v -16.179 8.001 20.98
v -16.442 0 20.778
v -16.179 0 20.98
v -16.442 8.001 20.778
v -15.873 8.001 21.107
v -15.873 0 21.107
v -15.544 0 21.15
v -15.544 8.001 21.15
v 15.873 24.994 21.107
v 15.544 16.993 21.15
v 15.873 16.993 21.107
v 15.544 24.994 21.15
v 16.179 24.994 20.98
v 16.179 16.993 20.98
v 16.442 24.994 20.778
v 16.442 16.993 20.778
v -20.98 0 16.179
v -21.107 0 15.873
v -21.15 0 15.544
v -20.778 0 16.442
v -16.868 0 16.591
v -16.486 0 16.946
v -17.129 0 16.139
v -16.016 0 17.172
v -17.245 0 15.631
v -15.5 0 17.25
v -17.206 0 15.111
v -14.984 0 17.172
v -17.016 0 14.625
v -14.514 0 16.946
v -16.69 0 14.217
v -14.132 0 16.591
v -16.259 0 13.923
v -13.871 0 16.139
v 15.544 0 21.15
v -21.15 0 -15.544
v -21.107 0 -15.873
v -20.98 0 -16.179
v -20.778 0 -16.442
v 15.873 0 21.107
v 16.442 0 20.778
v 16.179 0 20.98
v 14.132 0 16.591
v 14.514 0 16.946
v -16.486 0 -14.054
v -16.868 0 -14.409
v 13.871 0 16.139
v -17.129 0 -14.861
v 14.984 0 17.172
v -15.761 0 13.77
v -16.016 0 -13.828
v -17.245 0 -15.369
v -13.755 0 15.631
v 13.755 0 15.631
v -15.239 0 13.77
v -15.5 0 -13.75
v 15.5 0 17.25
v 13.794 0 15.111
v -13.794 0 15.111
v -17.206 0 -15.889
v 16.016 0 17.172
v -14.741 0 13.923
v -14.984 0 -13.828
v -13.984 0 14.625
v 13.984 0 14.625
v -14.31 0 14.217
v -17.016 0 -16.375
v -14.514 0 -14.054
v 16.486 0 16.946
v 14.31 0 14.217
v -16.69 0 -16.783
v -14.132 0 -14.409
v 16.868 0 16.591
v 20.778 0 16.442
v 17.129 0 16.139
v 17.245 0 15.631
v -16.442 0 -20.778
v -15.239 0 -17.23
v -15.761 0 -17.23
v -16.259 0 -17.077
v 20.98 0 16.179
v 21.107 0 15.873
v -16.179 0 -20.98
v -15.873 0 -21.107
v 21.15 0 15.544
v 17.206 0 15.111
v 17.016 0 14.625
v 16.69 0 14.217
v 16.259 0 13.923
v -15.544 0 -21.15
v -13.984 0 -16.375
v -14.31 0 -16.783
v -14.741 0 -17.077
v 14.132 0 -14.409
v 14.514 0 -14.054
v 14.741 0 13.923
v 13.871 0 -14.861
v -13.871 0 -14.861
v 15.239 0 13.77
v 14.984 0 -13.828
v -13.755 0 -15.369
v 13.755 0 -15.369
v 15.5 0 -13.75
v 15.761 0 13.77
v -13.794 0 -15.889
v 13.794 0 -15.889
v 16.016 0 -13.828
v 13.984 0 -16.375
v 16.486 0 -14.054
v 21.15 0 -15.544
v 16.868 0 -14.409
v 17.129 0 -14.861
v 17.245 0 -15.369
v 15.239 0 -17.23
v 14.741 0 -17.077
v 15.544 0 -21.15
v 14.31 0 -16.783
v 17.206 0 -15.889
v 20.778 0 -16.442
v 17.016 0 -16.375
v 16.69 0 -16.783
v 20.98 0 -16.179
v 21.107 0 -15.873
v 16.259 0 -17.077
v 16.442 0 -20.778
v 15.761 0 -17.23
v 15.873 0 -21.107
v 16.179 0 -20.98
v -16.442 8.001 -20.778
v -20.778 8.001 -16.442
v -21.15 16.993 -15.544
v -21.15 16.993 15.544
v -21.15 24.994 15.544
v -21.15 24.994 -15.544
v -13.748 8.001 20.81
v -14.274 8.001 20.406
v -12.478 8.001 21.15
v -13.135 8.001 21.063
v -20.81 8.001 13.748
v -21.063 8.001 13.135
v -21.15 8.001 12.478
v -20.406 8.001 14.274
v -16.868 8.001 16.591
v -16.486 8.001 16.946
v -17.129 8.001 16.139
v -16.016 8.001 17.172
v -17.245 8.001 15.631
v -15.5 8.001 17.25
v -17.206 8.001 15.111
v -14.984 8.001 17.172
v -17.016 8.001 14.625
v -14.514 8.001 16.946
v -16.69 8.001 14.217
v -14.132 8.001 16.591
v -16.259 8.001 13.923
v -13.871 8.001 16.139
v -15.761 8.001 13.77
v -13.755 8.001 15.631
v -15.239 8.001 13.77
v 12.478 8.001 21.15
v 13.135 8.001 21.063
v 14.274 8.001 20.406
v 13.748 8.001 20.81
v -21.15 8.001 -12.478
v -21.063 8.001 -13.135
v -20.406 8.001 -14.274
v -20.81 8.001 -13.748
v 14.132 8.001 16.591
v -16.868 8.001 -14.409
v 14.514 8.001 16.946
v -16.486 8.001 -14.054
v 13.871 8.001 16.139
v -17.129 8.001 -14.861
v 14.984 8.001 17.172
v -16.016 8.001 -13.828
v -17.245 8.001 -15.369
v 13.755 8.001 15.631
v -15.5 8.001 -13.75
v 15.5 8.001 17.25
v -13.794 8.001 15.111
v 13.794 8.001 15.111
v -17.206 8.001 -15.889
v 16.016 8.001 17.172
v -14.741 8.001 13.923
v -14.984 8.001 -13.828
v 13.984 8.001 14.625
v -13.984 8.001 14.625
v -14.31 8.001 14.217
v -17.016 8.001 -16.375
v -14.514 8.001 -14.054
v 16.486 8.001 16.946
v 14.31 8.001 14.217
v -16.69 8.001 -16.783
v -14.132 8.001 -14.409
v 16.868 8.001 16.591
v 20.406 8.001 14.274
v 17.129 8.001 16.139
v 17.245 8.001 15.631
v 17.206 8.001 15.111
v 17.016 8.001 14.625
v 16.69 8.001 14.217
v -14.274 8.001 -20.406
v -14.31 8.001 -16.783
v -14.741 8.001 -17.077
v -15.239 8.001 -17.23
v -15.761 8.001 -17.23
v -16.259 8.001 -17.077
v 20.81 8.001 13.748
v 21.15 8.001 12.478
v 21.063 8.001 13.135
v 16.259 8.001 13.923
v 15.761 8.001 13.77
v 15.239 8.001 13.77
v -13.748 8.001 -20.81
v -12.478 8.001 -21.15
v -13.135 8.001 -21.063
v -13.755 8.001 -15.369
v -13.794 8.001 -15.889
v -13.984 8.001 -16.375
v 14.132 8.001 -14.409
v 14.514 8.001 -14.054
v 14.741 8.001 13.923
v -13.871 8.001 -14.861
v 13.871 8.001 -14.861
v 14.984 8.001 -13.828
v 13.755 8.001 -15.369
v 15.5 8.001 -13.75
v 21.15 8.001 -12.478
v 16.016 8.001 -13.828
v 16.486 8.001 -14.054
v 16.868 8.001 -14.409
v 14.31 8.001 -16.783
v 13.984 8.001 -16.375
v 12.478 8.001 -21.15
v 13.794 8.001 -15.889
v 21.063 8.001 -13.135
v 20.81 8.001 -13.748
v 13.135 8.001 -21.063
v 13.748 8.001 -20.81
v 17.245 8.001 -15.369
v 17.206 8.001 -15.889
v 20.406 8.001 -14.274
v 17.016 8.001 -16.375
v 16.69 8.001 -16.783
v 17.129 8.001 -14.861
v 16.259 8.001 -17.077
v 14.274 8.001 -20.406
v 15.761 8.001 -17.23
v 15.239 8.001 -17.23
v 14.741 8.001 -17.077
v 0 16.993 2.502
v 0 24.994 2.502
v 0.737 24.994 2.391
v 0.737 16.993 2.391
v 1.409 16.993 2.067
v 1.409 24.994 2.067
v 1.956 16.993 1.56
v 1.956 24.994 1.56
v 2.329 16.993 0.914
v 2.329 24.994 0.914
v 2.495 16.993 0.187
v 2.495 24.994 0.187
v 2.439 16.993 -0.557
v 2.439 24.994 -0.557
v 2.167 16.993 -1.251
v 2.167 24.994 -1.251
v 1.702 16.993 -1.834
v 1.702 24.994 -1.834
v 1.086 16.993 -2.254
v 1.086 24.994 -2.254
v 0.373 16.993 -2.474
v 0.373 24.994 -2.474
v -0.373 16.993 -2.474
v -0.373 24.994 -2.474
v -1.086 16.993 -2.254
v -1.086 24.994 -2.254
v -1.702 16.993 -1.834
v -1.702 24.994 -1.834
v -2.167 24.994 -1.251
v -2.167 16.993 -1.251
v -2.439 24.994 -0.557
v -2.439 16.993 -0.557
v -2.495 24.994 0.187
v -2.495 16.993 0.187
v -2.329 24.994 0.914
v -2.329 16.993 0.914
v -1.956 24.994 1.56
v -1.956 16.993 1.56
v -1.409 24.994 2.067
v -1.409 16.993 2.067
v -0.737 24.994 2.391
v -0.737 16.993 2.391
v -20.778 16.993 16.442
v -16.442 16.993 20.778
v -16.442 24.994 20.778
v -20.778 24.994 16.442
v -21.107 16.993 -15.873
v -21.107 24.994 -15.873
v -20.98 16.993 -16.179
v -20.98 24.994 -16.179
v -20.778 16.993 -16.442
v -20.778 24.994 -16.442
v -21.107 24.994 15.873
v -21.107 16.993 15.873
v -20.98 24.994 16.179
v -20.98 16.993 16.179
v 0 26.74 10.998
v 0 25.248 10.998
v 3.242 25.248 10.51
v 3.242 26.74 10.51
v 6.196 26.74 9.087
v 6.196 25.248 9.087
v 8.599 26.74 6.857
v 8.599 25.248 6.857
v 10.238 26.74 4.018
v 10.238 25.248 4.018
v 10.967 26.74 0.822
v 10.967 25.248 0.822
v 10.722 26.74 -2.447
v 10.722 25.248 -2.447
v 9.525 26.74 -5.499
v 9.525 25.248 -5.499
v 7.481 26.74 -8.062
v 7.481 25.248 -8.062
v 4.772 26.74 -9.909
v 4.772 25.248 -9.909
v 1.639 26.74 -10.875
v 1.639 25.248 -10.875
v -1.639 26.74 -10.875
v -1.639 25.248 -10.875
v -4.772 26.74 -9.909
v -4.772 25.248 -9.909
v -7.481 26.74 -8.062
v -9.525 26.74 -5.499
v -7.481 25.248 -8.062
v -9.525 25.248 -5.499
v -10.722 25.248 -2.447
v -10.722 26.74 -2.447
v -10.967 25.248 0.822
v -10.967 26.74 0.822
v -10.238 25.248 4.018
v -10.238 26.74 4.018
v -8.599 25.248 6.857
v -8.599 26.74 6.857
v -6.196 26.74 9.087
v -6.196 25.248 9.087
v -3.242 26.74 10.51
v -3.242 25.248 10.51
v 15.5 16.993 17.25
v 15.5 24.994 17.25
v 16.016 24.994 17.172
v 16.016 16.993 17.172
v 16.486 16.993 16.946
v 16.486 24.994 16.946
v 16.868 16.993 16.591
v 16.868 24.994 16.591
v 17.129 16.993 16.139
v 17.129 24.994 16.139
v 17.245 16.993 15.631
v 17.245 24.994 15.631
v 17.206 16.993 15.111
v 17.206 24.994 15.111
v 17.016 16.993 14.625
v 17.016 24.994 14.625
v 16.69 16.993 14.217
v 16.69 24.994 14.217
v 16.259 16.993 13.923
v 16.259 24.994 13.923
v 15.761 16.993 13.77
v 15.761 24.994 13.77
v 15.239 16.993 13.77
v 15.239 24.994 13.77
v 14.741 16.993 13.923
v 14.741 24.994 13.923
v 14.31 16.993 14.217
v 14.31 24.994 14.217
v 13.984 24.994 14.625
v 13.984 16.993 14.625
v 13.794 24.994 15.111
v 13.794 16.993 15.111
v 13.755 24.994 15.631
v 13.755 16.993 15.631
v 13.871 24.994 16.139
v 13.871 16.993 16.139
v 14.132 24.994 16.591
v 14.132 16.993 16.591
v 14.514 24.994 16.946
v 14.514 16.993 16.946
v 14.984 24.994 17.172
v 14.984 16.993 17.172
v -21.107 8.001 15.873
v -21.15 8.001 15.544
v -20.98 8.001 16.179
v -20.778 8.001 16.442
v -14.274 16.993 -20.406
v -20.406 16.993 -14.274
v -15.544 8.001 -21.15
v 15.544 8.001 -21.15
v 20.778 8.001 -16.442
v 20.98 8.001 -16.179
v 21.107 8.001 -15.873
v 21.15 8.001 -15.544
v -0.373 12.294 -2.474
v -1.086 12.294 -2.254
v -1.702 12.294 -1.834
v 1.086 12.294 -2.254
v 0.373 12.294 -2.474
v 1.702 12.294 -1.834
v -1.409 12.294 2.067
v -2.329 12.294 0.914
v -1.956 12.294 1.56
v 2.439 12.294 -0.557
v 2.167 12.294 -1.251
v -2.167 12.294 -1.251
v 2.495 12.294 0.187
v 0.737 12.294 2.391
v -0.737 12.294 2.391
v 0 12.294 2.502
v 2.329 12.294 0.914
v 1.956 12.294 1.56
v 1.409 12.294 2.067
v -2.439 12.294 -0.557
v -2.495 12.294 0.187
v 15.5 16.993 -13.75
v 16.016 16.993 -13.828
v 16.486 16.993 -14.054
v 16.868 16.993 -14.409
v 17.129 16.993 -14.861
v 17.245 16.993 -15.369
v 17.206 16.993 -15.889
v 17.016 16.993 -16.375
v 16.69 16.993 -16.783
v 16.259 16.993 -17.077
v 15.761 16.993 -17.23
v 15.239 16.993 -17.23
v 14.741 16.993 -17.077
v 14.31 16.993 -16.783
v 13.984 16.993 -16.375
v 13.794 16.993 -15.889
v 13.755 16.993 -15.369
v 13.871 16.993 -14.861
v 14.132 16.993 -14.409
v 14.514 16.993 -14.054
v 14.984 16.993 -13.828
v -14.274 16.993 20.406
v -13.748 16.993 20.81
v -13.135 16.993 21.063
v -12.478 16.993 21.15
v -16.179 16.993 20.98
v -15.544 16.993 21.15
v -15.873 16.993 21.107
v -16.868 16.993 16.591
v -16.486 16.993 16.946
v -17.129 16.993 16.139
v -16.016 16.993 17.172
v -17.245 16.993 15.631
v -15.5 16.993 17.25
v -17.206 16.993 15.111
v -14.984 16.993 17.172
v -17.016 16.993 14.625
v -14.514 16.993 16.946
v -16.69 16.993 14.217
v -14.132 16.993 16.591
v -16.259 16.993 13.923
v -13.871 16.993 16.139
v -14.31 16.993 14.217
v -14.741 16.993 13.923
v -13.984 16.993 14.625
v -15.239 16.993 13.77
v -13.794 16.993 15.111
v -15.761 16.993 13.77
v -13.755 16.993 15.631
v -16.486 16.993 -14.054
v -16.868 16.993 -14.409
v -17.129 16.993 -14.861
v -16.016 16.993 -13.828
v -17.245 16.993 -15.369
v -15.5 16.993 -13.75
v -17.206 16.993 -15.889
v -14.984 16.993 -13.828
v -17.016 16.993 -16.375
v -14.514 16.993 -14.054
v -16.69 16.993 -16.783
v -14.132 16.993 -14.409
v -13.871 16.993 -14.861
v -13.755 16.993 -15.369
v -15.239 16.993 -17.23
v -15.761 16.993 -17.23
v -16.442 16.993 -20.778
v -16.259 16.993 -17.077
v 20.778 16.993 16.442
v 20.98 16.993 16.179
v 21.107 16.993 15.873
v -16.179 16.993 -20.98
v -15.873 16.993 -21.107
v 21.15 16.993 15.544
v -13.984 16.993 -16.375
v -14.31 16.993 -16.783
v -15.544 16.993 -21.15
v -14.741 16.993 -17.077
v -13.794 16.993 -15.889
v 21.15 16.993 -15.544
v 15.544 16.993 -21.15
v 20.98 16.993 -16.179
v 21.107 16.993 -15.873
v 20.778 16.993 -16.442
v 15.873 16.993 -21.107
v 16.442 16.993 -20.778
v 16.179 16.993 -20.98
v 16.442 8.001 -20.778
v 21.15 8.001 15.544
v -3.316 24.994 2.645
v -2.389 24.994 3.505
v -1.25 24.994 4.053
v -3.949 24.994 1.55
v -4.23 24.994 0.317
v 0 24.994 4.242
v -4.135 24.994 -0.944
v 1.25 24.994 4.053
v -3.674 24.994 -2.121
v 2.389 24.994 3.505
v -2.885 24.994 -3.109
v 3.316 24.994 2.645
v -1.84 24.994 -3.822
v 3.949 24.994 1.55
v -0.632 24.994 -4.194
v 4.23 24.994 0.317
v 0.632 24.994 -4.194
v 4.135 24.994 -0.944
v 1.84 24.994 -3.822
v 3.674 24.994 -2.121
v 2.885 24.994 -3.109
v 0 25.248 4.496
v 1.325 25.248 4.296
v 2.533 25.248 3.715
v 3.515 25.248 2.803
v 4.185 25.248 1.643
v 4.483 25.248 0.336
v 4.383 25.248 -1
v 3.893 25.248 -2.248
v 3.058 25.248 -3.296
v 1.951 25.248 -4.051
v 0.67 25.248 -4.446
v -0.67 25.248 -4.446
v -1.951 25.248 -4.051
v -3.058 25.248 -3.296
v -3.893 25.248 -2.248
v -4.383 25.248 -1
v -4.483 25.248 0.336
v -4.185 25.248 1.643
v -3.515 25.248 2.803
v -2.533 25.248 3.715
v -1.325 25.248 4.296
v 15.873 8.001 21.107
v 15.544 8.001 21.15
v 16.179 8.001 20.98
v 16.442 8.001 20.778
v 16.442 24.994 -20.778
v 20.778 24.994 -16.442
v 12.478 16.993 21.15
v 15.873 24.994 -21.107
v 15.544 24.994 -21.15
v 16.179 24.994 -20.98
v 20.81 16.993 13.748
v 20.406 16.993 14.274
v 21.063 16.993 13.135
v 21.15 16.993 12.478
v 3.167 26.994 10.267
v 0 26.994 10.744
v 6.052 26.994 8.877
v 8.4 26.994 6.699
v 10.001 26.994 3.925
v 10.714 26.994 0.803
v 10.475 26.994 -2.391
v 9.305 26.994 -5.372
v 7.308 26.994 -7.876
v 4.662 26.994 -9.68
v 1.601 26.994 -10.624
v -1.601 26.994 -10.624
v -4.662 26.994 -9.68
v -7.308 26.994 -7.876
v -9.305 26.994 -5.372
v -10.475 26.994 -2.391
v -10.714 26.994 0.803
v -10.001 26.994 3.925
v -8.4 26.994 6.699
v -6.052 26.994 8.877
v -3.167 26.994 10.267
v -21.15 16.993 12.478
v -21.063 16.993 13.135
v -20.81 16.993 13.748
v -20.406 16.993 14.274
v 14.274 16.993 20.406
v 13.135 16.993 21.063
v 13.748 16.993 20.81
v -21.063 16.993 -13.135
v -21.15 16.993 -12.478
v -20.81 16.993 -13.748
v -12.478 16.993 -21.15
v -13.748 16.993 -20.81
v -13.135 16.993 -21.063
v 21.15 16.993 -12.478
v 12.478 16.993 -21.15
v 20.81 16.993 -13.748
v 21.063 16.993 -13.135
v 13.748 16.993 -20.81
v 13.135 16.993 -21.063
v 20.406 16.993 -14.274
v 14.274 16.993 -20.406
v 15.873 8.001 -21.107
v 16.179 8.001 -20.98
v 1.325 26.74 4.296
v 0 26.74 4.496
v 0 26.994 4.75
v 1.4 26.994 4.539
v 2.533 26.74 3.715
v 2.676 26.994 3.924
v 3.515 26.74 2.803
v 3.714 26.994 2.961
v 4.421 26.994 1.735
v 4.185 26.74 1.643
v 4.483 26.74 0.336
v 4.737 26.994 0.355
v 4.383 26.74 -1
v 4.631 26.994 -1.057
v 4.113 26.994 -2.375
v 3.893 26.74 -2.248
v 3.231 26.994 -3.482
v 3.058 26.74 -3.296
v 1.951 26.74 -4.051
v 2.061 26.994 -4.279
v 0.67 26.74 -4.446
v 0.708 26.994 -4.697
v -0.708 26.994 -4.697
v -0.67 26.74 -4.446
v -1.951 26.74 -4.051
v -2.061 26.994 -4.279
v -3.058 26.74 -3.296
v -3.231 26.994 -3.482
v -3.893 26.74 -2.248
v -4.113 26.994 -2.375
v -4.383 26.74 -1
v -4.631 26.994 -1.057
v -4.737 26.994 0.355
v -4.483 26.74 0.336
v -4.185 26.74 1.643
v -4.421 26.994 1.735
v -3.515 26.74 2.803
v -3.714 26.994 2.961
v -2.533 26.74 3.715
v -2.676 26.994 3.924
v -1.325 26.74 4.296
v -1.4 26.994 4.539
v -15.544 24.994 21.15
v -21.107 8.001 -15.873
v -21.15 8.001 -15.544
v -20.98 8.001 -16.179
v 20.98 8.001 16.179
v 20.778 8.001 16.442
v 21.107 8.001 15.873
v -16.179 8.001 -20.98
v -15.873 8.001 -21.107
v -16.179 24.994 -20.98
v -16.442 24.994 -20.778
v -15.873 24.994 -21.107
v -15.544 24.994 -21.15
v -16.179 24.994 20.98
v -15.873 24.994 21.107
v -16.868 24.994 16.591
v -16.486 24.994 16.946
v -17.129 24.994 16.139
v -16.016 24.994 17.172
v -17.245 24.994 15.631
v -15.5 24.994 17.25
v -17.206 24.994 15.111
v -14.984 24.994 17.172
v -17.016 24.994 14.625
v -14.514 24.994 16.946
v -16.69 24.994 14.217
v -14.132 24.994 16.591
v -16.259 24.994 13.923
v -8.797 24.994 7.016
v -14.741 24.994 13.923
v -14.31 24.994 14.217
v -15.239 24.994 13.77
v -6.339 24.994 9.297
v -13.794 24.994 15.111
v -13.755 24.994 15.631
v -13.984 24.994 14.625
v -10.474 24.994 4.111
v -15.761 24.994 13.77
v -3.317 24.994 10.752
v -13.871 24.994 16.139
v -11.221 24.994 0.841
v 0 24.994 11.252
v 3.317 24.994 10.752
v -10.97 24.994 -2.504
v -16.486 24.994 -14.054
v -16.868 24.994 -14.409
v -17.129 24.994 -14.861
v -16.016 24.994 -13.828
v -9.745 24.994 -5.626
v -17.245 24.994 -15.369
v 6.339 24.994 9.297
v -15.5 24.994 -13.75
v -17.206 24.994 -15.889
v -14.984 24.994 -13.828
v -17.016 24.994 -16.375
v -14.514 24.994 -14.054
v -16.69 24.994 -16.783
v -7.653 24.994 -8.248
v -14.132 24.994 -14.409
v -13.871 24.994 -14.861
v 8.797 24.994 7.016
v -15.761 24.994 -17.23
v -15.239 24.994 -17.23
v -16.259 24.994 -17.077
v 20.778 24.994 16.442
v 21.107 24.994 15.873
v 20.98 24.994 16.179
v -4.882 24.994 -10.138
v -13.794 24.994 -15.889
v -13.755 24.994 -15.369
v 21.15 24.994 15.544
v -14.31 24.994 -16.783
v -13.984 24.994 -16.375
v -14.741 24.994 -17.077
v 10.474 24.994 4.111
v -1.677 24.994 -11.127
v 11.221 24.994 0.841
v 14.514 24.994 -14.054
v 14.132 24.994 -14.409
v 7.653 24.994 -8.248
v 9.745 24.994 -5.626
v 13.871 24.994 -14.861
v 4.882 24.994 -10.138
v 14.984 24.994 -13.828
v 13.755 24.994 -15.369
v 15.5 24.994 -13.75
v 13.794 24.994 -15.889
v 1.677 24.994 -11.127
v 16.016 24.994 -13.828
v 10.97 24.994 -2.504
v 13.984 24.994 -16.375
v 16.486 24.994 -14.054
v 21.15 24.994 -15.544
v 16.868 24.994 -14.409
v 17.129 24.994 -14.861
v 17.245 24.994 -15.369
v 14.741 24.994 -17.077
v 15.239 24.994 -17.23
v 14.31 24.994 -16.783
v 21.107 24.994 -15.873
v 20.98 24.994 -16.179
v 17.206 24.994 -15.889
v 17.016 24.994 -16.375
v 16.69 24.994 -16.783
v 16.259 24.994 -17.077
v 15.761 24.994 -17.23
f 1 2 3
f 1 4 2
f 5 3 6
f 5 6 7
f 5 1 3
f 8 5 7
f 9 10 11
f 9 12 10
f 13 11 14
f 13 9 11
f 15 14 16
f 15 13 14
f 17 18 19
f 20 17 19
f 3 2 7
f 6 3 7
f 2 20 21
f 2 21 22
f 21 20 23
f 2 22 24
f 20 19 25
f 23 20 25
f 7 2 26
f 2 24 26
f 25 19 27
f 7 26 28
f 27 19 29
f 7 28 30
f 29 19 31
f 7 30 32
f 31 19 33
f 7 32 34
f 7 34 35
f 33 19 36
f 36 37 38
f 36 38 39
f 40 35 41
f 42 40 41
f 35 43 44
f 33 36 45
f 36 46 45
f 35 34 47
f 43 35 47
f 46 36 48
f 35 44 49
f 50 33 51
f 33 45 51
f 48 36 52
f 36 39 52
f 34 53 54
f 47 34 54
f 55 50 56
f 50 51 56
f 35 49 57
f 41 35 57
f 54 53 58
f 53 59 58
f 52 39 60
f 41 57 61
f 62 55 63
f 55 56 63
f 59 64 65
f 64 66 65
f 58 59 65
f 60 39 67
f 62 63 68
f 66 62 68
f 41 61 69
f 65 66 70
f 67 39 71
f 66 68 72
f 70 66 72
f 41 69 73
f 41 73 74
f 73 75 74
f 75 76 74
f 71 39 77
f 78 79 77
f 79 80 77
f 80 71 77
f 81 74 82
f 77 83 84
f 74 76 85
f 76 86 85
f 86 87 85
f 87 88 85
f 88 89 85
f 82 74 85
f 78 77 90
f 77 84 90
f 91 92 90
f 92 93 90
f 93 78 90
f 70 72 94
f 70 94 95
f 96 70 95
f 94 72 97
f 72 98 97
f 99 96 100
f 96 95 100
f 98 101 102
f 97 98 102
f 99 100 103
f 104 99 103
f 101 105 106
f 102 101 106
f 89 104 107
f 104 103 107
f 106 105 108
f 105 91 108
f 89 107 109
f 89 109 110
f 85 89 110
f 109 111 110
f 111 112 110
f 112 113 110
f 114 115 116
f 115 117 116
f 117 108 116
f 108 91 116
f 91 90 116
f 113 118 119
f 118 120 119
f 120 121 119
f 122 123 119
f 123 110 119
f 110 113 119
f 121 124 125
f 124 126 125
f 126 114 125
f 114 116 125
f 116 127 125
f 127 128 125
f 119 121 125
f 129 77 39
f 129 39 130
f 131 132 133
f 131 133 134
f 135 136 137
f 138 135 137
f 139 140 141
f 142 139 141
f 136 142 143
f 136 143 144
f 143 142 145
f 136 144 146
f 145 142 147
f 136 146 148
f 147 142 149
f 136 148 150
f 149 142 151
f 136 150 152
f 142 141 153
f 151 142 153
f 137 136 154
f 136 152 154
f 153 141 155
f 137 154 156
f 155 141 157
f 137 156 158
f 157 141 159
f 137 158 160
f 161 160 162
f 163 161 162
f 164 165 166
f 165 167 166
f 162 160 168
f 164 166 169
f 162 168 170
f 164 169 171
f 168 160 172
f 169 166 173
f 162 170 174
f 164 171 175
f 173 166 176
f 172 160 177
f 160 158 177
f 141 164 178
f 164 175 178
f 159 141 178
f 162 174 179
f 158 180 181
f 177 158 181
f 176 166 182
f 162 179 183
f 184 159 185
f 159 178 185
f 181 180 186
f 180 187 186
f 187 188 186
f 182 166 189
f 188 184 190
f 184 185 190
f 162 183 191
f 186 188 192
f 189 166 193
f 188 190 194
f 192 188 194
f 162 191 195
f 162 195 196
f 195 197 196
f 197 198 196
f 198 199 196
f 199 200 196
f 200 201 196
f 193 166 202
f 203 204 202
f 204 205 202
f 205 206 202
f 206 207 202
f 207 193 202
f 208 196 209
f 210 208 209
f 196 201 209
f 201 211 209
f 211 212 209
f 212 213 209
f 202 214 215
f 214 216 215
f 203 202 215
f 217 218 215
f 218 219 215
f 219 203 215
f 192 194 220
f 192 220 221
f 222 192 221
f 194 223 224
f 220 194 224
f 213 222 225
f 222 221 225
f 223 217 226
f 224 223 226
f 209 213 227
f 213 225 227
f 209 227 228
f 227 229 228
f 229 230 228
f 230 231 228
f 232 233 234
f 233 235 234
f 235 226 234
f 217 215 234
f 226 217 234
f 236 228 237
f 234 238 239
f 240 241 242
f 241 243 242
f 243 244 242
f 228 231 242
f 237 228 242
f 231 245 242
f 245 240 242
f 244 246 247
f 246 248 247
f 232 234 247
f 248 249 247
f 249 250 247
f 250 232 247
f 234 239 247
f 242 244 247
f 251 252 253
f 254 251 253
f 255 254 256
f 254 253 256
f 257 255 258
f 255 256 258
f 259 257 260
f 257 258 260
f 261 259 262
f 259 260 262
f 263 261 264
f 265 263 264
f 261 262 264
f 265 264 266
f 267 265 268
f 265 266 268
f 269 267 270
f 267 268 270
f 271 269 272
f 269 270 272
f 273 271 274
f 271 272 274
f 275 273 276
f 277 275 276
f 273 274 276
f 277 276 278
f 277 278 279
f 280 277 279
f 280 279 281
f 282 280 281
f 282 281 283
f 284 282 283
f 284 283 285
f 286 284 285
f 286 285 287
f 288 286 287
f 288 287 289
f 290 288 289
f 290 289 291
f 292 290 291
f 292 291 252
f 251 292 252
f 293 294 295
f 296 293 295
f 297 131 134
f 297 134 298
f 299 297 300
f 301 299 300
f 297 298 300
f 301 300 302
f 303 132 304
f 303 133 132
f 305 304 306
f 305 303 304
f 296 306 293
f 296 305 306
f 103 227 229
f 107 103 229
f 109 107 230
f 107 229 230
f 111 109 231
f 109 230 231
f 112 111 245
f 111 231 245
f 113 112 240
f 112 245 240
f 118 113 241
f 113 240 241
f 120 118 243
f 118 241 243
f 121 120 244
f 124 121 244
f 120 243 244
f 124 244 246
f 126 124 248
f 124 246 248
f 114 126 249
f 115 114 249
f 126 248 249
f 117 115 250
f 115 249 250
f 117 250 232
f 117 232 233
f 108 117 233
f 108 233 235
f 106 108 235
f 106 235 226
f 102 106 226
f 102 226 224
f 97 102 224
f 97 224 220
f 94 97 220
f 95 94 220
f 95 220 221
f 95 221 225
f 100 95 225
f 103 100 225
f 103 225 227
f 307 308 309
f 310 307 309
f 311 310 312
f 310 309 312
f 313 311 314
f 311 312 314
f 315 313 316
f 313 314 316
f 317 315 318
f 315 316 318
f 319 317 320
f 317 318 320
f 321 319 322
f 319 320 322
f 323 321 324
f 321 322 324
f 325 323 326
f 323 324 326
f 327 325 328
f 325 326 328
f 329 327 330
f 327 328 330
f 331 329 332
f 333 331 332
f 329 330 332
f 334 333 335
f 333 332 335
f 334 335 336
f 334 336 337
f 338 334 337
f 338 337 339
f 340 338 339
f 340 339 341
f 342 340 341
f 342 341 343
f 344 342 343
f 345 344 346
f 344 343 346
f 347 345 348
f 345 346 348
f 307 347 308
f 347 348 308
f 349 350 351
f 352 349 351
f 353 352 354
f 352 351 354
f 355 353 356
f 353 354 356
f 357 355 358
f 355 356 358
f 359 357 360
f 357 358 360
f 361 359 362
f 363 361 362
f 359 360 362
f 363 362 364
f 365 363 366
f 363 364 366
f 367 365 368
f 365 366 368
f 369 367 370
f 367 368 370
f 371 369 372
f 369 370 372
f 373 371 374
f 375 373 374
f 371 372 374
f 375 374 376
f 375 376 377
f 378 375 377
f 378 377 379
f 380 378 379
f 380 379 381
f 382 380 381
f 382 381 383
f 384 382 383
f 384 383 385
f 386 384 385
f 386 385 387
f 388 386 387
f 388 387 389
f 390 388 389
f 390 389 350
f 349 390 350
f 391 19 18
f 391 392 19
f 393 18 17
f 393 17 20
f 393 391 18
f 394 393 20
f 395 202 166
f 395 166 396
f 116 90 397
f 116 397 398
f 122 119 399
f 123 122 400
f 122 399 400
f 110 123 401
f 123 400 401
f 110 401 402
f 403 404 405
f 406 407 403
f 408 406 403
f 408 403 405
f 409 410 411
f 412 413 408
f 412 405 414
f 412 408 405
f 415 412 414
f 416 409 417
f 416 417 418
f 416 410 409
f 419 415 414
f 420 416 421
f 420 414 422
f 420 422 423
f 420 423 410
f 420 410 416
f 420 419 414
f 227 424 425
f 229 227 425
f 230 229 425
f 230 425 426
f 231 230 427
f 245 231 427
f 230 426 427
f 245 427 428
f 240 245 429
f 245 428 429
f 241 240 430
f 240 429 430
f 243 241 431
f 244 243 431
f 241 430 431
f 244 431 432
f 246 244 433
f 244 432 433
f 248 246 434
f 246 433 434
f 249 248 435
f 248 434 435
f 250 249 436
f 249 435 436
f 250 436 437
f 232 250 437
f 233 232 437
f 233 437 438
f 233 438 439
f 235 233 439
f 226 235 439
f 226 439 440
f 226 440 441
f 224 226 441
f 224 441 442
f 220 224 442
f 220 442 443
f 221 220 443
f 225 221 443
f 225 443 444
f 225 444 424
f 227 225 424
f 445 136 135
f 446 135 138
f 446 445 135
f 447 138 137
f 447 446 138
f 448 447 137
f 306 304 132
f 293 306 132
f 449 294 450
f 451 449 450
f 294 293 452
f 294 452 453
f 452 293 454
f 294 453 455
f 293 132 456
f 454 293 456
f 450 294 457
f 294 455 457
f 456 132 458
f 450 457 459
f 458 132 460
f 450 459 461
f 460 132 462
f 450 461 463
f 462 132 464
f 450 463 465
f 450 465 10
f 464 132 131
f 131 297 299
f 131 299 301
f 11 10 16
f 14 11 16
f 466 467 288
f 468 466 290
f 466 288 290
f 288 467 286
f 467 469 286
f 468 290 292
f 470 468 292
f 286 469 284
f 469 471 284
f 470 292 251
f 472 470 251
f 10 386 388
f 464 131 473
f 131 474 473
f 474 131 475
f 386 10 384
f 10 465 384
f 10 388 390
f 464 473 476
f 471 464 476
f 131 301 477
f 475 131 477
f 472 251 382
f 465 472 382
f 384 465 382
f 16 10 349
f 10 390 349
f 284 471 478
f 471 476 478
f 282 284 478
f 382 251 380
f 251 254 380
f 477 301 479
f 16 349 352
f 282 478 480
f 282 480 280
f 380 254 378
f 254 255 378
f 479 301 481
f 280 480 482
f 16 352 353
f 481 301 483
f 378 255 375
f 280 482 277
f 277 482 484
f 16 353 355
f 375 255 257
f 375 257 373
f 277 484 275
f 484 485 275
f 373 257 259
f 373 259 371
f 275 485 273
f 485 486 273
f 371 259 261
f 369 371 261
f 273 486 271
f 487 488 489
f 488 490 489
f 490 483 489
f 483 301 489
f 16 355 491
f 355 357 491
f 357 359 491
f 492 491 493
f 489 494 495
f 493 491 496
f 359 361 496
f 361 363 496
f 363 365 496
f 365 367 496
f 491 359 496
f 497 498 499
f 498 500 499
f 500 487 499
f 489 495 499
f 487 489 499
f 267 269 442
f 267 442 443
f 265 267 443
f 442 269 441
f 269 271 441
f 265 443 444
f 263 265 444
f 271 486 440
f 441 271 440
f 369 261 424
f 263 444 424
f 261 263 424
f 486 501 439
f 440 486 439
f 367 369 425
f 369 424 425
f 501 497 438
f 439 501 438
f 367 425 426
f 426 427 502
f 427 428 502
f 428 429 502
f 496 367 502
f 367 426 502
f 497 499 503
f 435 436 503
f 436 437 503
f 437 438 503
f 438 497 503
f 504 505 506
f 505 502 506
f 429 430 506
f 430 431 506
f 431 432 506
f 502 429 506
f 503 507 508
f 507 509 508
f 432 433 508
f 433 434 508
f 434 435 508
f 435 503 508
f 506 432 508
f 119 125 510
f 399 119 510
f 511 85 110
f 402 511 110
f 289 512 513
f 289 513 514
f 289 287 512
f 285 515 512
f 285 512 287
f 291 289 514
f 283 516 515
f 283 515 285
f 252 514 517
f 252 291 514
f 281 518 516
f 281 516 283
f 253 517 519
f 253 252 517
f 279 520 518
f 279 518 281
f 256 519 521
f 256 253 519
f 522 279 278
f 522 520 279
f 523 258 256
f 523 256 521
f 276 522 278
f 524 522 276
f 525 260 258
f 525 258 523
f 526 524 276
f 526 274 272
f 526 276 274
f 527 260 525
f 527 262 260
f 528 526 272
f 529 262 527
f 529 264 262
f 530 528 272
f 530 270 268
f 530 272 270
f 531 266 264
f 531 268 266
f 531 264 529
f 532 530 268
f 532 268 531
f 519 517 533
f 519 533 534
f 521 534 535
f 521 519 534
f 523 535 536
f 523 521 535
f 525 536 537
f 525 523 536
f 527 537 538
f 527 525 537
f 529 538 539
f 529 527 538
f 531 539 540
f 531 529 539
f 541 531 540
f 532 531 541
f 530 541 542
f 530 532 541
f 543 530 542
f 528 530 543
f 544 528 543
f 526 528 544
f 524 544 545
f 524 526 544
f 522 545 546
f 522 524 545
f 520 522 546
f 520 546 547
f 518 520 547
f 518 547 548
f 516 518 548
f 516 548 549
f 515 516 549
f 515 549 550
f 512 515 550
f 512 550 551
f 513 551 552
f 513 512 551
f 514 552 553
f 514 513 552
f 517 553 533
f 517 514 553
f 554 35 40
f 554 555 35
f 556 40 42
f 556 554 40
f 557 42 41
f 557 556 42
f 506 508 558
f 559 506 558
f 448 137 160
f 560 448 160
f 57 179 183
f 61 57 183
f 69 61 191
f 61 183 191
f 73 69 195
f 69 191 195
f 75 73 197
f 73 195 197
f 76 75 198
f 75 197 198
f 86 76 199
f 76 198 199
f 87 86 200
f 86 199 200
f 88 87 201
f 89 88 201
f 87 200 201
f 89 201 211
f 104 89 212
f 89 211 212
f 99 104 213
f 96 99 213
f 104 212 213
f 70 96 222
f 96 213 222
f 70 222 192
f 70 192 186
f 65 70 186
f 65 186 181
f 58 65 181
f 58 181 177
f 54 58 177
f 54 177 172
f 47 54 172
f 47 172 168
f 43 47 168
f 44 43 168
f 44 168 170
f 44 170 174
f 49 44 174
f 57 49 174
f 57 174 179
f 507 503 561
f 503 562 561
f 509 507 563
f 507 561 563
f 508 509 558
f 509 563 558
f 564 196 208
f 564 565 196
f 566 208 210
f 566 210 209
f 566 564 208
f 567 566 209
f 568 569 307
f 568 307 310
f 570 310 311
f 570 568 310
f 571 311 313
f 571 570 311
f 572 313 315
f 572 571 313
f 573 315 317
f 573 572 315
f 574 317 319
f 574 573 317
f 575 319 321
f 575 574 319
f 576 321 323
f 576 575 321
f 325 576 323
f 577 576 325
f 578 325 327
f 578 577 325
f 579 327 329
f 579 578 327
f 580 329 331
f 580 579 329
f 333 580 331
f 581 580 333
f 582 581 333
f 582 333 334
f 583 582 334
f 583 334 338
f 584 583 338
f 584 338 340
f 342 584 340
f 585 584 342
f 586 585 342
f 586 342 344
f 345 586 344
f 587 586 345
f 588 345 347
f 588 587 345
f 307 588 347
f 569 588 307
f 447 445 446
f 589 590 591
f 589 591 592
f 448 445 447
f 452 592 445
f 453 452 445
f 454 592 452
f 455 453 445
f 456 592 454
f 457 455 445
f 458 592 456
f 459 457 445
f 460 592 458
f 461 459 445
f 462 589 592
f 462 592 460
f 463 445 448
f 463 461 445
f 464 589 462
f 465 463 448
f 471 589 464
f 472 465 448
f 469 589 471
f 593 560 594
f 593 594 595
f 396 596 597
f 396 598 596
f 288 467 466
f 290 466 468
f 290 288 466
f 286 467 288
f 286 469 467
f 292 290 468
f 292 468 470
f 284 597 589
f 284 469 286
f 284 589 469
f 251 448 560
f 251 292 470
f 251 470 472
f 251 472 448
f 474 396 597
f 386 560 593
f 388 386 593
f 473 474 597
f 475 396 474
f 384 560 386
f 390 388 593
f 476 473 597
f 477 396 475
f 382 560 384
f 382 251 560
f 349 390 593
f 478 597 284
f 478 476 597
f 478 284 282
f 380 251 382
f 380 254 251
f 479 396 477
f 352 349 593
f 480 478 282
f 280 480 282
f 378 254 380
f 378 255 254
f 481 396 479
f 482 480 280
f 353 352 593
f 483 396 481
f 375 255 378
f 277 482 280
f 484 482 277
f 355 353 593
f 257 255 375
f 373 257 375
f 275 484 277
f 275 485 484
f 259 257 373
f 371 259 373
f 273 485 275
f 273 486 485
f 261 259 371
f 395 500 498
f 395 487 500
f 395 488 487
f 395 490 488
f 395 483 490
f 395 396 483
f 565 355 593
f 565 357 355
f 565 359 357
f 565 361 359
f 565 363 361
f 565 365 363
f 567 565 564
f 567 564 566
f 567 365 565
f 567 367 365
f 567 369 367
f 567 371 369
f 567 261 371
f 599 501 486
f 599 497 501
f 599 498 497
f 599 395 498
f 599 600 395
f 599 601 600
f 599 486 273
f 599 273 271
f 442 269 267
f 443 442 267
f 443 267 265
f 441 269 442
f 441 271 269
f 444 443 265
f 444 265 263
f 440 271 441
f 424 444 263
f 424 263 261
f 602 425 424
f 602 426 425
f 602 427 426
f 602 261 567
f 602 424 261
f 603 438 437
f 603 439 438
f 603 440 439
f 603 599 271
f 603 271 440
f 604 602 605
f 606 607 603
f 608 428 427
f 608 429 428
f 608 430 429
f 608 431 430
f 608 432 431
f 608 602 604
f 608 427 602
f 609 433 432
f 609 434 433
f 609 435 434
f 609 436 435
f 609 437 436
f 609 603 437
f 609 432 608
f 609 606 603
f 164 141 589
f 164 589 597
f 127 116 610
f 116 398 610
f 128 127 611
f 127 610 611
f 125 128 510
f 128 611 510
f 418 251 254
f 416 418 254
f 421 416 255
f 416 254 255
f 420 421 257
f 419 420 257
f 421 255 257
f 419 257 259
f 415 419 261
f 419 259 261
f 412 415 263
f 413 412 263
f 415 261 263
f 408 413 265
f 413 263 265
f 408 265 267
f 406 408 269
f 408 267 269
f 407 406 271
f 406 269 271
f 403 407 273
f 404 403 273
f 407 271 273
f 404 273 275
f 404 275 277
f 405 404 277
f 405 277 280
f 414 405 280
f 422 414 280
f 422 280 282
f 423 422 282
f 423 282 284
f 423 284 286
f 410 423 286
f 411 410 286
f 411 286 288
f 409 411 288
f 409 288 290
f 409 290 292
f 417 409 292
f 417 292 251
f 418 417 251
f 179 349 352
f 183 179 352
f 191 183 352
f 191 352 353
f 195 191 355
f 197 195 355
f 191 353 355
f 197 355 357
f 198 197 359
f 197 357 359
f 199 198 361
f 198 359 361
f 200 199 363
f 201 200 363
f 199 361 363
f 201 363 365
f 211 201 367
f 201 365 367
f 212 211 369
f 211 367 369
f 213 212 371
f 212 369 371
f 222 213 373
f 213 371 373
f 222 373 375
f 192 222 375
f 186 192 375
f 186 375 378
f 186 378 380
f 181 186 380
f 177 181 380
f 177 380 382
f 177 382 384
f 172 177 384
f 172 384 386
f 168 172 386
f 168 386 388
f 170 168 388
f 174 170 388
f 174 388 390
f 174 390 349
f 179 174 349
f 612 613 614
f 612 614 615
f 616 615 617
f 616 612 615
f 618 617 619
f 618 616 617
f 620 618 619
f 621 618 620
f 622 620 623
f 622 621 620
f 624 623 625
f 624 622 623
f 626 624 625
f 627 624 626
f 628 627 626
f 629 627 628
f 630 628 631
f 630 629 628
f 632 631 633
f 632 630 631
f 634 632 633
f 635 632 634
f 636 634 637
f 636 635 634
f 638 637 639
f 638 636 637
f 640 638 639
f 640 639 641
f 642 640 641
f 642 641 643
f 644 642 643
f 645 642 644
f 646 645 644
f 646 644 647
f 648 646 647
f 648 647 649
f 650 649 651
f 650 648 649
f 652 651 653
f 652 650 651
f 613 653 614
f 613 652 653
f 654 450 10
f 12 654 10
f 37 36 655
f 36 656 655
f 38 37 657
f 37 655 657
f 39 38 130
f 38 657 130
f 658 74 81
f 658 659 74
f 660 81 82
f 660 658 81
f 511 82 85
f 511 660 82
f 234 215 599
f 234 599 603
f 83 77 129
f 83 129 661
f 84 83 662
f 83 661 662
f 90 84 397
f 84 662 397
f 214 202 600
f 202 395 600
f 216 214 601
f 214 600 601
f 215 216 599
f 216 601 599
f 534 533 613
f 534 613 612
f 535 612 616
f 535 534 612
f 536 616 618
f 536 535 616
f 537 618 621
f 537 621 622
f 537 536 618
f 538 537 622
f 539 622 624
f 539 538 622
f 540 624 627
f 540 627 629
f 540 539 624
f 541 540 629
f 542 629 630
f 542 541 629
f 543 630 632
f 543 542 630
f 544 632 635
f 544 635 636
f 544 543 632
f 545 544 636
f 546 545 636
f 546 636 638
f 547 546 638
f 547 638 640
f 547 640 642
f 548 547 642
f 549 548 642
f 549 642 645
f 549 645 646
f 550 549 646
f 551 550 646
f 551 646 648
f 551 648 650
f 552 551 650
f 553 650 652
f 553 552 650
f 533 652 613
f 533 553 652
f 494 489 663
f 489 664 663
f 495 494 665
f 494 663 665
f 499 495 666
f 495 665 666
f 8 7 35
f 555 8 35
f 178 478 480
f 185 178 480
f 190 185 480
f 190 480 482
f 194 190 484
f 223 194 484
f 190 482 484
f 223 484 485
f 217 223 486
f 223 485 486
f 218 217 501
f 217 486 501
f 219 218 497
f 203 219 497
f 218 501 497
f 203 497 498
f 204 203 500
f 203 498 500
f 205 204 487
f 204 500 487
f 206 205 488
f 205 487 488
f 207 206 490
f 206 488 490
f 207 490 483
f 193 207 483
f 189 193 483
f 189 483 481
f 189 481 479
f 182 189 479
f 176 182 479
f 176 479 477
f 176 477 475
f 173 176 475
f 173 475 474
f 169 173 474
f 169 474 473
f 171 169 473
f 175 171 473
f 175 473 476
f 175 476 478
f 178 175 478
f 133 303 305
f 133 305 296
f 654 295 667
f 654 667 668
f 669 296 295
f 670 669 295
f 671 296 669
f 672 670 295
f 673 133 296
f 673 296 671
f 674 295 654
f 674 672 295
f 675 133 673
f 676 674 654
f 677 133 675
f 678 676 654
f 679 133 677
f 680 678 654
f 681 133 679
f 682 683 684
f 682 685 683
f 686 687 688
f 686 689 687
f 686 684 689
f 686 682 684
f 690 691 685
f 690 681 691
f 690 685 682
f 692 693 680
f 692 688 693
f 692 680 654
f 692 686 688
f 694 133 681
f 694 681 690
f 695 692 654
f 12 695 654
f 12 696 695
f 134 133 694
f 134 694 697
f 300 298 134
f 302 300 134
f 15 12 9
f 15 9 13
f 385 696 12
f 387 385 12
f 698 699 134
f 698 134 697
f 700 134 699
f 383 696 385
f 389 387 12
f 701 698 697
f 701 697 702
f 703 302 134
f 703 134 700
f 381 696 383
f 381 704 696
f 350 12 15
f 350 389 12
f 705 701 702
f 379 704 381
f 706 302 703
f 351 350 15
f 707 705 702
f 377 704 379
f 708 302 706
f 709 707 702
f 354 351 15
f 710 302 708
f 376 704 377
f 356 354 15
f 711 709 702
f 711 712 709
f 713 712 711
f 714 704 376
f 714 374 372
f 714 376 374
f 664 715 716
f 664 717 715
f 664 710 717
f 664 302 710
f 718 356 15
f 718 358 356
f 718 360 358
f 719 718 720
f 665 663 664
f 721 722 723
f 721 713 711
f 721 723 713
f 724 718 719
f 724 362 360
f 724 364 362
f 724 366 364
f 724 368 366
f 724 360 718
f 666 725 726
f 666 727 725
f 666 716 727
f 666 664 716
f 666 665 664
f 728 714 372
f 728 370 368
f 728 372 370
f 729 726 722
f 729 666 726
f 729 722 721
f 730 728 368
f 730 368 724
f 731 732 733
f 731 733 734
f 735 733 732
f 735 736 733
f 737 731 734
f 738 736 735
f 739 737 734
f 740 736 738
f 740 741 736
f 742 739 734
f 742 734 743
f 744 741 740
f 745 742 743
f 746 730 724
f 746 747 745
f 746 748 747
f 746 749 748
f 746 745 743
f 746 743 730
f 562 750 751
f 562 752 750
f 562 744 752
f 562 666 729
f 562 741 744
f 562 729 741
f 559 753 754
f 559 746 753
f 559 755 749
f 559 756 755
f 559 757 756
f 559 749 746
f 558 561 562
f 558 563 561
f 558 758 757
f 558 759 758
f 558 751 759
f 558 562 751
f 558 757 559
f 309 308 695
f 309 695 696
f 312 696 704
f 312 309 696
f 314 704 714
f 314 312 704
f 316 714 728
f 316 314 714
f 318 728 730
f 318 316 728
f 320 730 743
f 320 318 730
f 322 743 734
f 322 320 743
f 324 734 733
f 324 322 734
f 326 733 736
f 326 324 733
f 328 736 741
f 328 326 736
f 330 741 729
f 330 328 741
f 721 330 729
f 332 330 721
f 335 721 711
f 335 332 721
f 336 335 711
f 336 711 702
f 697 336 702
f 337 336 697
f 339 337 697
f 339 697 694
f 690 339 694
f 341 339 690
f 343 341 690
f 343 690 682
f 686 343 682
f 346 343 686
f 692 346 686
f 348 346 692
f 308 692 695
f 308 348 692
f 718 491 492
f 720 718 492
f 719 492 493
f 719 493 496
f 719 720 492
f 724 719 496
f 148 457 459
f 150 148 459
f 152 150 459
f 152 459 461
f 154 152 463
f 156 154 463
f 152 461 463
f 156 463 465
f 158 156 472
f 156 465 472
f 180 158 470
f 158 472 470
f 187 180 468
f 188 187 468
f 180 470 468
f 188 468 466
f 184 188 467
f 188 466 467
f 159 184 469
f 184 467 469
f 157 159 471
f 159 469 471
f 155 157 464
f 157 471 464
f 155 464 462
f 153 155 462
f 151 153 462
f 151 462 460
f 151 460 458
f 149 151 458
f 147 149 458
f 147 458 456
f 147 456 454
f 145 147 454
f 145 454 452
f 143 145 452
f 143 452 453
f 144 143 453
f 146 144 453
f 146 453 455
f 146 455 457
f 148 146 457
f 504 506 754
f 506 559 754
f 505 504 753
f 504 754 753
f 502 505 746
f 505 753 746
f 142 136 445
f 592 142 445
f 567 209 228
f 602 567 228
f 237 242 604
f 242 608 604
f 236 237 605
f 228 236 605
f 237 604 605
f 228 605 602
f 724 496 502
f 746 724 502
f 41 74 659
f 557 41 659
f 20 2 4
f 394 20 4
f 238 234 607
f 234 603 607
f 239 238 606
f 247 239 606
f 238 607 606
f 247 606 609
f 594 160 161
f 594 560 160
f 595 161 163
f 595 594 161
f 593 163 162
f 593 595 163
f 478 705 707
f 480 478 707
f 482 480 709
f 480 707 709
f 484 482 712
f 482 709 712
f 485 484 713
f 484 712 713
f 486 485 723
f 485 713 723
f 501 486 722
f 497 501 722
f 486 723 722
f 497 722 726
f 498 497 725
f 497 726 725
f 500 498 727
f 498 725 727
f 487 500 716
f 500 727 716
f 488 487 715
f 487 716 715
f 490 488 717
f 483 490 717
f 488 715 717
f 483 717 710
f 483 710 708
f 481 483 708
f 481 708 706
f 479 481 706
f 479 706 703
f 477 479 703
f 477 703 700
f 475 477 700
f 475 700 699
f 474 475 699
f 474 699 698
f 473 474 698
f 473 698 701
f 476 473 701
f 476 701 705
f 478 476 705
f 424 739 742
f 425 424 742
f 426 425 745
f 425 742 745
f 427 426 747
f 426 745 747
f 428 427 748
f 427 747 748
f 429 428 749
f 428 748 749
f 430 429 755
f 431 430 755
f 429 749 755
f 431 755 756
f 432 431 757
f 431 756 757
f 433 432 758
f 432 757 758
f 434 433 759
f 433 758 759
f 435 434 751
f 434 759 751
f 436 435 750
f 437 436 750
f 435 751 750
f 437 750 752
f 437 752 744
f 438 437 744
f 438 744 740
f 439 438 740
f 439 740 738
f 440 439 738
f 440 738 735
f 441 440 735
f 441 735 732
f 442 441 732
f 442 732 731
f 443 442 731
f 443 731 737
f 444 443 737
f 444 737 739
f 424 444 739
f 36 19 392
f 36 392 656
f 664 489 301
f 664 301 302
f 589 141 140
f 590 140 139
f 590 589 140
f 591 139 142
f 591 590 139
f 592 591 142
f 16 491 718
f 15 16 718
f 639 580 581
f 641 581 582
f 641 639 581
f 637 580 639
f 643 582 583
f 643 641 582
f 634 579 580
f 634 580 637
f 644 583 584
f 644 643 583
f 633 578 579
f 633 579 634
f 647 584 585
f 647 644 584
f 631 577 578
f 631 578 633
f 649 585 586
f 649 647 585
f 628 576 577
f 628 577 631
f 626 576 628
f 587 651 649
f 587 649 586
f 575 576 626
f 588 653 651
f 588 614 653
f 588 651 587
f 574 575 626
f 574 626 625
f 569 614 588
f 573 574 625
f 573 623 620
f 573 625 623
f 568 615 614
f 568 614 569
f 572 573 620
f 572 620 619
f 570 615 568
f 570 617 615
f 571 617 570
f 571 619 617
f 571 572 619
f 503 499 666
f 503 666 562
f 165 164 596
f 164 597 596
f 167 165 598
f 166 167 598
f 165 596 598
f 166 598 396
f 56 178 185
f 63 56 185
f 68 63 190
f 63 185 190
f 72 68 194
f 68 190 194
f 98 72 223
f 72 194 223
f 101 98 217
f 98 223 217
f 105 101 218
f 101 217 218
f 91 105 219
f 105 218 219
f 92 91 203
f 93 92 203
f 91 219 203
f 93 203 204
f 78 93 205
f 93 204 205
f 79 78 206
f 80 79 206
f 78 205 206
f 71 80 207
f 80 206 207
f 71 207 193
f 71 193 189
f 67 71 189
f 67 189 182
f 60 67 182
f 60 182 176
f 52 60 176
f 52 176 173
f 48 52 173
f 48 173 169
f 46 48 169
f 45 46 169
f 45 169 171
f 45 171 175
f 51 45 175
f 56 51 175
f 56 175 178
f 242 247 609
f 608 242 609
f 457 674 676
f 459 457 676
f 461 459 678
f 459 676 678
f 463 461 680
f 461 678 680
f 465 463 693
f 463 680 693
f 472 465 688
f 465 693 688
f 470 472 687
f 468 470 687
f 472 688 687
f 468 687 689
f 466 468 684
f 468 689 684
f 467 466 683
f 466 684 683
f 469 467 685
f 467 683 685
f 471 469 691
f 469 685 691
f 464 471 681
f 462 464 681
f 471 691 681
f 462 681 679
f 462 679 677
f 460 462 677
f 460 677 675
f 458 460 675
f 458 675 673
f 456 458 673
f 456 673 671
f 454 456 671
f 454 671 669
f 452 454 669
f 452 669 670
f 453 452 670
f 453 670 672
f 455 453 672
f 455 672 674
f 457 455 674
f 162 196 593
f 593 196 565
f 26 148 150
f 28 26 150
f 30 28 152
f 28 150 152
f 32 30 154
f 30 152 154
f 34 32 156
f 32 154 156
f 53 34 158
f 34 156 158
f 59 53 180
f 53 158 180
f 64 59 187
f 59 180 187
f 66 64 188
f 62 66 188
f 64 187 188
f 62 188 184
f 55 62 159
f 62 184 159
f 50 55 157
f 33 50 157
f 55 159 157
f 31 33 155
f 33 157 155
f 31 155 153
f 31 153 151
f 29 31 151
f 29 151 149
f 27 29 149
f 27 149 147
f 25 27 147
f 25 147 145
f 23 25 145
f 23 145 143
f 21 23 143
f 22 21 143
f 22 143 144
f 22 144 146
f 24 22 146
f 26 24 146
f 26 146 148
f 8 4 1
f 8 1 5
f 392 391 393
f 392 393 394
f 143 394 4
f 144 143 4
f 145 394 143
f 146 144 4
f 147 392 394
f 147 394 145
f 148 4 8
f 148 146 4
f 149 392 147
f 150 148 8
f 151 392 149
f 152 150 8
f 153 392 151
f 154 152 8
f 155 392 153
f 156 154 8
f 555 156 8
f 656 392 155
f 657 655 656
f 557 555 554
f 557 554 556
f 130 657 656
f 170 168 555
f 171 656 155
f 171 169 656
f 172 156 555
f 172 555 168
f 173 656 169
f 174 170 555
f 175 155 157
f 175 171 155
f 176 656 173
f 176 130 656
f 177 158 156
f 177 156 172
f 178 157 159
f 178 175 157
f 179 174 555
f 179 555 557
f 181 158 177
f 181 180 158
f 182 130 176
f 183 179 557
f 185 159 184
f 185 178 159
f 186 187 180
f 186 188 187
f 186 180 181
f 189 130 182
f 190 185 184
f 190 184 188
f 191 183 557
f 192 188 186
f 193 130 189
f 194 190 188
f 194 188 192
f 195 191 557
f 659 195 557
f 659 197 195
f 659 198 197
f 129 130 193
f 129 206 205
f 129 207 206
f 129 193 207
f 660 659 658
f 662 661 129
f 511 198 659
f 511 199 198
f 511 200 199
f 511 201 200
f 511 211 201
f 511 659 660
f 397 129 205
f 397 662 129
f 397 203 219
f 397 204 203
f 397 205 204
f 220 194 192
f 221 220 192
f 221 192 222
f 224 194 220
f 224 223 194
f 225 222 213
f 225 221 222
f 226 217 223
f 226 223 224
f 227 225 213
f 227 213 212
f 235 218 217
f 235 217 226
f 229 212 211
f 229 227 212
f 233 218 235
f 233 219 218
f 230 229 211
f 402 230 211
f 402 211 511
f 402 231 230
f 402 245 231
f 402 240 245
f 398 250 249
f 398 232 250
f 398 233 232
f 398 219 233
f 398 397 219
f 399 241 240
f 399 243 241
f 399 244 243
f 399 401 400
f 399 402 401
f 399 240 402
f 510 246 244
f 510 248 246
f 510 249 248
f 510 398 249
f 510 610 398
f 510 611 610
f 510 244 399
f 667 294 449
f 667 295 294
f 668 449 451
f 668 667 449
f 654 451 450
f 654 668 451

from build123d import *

# Parameters (mm, degrees)
SKETCH1_W           = 42.3
SKETCH1_H           = 42.3
BOSS_EXTRUDE1_DEPTH = 8.001
CHAMFER1_SIZE       = 5.08
SKETCH2_W           = 42.3
SKETCH2_H           = 42.3
BOSS_EXTRUDE2_DEPTH = 8.9916
CHAMFER3_SIZE       = 7.62
FILLET1_R           = 2.54
FILLET2_R           = 1.27
SKETCH3_W           = 42.3
SKETCH3_H           = 42.3
BOSS_EXTRUDE3_DEPTH = 8.001
CHAMFER4_SIZE       = 5.08
FILLET3_R           = 1.27
SKETCH4_R           = 10.9982
SKETCH4_R_2         = 4.4958
BOSS_EXTRUDE4_DEPTH = 2
CHAMFER5_SIZE       = 0.254
SKETCH5_R           = 2.5019
CUT_EXTRUDE1_DEPTH  = 12.7
SKETCH6_R           = 1.75
CUT_EXTRUDE2_DEPTH  = 39.978520251


with BuildPart() as part:
    # Sketch1 → Boss-Extrude1 (new body)
    with BuildSketch(Plane(origin=(0, 0, 0), x_dir=(1, 0, 0), z_dir=(0, 1, 0))):
        Rectangle(SKETCH1_W, SKETCH1_H)
    extrude(amount=BOSS_EXTRUDE1_DEPTH)

    # Chamfer1
    chamfer1_edges = [part.edges().sort_by_distance(p)[0] for p in [
        (21.15, 4.0005, 21.15),
        (-21.15, 4.0005, 21.15),
        (-21.15, 4.0005, -21.15),
        (21.15, 4.0005, -21.15),
    ]]
    chamfer(chamfer1_edges, length=CHAMFER1_SIZE)

    # Fillet2
    fillet2_edges = [part.edges().sort_by_distance(p)[0] for p in [
        (16.07, 4.0005, 21.15),
        (-16.07, 4.0005, 21.15),
        (-21.15, 4.0005, -16.07),
        (-21.15, 4.0005, 16.07),
        (16.07, 4.0005, -21.15),
        (-16.07, 4.0005, -21.15),
        (21.15, 4.0005, 16.07),
        (21.15, 4.0005, -16.07),
    ]]
    fillet(fillet2_edges, radius=FILLET2_R)


with BuildPart() as body_2:
    # Sketch2 → Boss-Extrude2 (new body)
    with BuildSketch(Plane(origin=(0, 8.001, 0), x_dir=(1, 0, 0), z_dir=(0, 1, 0))):
        Rectangle(SKETCH2_W, SKETCH2_H)
    extrude(amount=BOSS_EXTRUDE2_DEPTH)

    # Chamfer3
    chamfer3_edges = [body_2.edges().sort_by_distance(p)[0] for p in [
        (21.15, 12.4968, 21.15),
        (-21.15, 12.4968, 21.15),
        (-21.15, 12.4968, -21.15),
        (21.15, 12.4968, -21.15),
    ]]
    chamfer(chamfer3_edges, length=CHAMFER3_SIZE)

    # Fillet1
    fillet1_edges = [body_2.edges().sort_by_distance(p)[0] for p in [
        (-21.15, 12.4968, 13.53),
        (-21.15, 12.4968, -13.53),
        (13.53, 12.4968, -21.15),
        (-13.53, 12.4968, -21.15),
        (13.53, 12.4968, 21.15),
        (-13.53, 12.4968, 21.15),
        (21.15, 12.4968, -13.53),
        (21.15, 12.4968, 13.53),
    ]]
    fillet(fillet1_edges, radius=FILLET1_R)


with BuildPart() as body_3:
    # Sketch3 → Boss-Extrude3 (new body)
    with BuildSketch(Plane(origin=(0, 16.9926, 0), x_dir=(1, 0, 0), z_dir=(0, 1, 0))):
        Rectangle(SKETCH3_W, SKETCH3_H)
    extrude(amount=BOSS_EXTRUDE3_DEPTH)

    # Chamfer4
    chamfer4_edges = [body_3.edges().sort_by_distance(p)[0] for p in [
        (21.15, 20.9931, 21.15),
        (-21.15, 20.9931, 21.15),
        (-21.15, 20.9931, -21.15),
        (21.15, 20.9931, -21.15),
    ]]
    chamfer(chamfer4_edges, length=CHAMFER4_SIZE)

    # Fillet3
    fillet3_edges = [body_3.edges().sort_by_distance(p)[0] for p in [
        (16.07, 20.9931, 21.15),
        (-16.07, 20.9931, 21.15),
        (-21.15, 20.9931, -16.07),
        (-21.15, 20.9931, 16.07),
        (16.07, 20.9931, -21.15),
        (-16.07, 20.9931, -21.15),
        (21.15, 20.9931, 16.07),
        (21.15, 20.9931, -16.07),
    ]]
    fillet(fillet3_edges, radius=FILLET3_R)

    # Sketch4 → Boss-Extrude4 (add)
    with BuildSketch(Plane(origin=(0, 24.9936, 0), x_dir=(1, 0, 0), z_dir=(0, 1, 0))):
        with Locations(Location((0, 0, 0), (0, 0, 270))):
            Circle(SKETCH4_R)
        with Locations(Location((0, 0, 0), (0, 0, 270))):
            Circle(SKETCH4_R_2, mode=Mode.SUBTRACT)
    extrude(amount=BOSS_EXTRUDE4_DEPTH)

    # Chamfer5
    chamfer5_edges = [body_3.edges().sort_by_distance(p)[0] for p in [
        (0, 26.9936, -10.9982),
        (0, 24.9936, -10.9982),
        (0, 26.9936, -4.4958),
        (0, 24.9936, -4.4958),
    ]]
    chamfer(chamfer5_edges, length=CHAMFER5_SIZE)


with BuildPart() as cut_extrude1_tool:
    # Sketch5 → Cut-Extrude1 (new body)
    with BuildSketch(Plane(origin=(0, 24.9936, 0), x_dir=(1, 0, 0), z_dir=(0, 1, 0))):
        with Locations(Location((0, 0, 0), (0, 0, 270))):
            Circle(SKETCH5_R)
    extrude(amount=-CUT_EXTRUDE1_DEPTH)


with BuildPart() as body_2_1:
    add(body_2.part)

    # Cut-Extrude1: cut by cut_extrude1_tool
    add(cut_extrude1_tool.part, mode=Mode.SUBTRACT)


with BuildPart() as body_3_1:
    add(body_3.part)

    # Cut-Extrude1: cut by cut_extrude1_tool
    add(cut_extrude1_tool.part, mode=Mode.SUBTRACT)


with BuildPart() as cut_extrude2_tool:
    # Sketch6 → Cut-Extrude2 (new, through all)
    with BuildSketch(Plane(origin=(0, 24.9936, 0), x_dir=(1, 0, 0), z_dir=(0, 1, 0))):
        with Locations(Location((15.5, -15.5, 0), (0, 0, 270))):
            Circle(SKETCH6_R)
        with Locations(Location((-15.499999976, -15.5, 0), (0, 0, 270))):
            Circle(SKETCH6_R)
        with Locations(Location((-15.499999976, 15.499999976, 0), (0, 0, 270))):
            Circle(SKETCH6_R)
        with Locations(Location((15.5, 15.499999976, 0), (0, 0, 270))):
            Circle(SKETCH6_R)
    extrude(amount=-CUT_EXTRUDE2_DEPTH)


with BuildPart() as part_1:
    add(part.part)

    # Cut-Extrude2: cut by cut_extrude2_tool
    add(cut_extrude2_tool.part, mode=Mode.SUBTRACT)


with BuildPart() as body_2_2:
    add(body_2_1.part)

    # Cut-Extrude2: cut by cut_extrude2_tool
    add(cut_extrude2_tool.part, mode=Mode.SUBTRACT)


with BuildPart() as body_3_2:
    add(body_3_1.part)

    # Cut-Extrude2: cut by cut_extrude2_tool
    add(cut_extrude2_tool.part, mode=Mode.SUBTRACT)


solid = Compound([part_1.part, body_2_2.part, body_3_2.part])
